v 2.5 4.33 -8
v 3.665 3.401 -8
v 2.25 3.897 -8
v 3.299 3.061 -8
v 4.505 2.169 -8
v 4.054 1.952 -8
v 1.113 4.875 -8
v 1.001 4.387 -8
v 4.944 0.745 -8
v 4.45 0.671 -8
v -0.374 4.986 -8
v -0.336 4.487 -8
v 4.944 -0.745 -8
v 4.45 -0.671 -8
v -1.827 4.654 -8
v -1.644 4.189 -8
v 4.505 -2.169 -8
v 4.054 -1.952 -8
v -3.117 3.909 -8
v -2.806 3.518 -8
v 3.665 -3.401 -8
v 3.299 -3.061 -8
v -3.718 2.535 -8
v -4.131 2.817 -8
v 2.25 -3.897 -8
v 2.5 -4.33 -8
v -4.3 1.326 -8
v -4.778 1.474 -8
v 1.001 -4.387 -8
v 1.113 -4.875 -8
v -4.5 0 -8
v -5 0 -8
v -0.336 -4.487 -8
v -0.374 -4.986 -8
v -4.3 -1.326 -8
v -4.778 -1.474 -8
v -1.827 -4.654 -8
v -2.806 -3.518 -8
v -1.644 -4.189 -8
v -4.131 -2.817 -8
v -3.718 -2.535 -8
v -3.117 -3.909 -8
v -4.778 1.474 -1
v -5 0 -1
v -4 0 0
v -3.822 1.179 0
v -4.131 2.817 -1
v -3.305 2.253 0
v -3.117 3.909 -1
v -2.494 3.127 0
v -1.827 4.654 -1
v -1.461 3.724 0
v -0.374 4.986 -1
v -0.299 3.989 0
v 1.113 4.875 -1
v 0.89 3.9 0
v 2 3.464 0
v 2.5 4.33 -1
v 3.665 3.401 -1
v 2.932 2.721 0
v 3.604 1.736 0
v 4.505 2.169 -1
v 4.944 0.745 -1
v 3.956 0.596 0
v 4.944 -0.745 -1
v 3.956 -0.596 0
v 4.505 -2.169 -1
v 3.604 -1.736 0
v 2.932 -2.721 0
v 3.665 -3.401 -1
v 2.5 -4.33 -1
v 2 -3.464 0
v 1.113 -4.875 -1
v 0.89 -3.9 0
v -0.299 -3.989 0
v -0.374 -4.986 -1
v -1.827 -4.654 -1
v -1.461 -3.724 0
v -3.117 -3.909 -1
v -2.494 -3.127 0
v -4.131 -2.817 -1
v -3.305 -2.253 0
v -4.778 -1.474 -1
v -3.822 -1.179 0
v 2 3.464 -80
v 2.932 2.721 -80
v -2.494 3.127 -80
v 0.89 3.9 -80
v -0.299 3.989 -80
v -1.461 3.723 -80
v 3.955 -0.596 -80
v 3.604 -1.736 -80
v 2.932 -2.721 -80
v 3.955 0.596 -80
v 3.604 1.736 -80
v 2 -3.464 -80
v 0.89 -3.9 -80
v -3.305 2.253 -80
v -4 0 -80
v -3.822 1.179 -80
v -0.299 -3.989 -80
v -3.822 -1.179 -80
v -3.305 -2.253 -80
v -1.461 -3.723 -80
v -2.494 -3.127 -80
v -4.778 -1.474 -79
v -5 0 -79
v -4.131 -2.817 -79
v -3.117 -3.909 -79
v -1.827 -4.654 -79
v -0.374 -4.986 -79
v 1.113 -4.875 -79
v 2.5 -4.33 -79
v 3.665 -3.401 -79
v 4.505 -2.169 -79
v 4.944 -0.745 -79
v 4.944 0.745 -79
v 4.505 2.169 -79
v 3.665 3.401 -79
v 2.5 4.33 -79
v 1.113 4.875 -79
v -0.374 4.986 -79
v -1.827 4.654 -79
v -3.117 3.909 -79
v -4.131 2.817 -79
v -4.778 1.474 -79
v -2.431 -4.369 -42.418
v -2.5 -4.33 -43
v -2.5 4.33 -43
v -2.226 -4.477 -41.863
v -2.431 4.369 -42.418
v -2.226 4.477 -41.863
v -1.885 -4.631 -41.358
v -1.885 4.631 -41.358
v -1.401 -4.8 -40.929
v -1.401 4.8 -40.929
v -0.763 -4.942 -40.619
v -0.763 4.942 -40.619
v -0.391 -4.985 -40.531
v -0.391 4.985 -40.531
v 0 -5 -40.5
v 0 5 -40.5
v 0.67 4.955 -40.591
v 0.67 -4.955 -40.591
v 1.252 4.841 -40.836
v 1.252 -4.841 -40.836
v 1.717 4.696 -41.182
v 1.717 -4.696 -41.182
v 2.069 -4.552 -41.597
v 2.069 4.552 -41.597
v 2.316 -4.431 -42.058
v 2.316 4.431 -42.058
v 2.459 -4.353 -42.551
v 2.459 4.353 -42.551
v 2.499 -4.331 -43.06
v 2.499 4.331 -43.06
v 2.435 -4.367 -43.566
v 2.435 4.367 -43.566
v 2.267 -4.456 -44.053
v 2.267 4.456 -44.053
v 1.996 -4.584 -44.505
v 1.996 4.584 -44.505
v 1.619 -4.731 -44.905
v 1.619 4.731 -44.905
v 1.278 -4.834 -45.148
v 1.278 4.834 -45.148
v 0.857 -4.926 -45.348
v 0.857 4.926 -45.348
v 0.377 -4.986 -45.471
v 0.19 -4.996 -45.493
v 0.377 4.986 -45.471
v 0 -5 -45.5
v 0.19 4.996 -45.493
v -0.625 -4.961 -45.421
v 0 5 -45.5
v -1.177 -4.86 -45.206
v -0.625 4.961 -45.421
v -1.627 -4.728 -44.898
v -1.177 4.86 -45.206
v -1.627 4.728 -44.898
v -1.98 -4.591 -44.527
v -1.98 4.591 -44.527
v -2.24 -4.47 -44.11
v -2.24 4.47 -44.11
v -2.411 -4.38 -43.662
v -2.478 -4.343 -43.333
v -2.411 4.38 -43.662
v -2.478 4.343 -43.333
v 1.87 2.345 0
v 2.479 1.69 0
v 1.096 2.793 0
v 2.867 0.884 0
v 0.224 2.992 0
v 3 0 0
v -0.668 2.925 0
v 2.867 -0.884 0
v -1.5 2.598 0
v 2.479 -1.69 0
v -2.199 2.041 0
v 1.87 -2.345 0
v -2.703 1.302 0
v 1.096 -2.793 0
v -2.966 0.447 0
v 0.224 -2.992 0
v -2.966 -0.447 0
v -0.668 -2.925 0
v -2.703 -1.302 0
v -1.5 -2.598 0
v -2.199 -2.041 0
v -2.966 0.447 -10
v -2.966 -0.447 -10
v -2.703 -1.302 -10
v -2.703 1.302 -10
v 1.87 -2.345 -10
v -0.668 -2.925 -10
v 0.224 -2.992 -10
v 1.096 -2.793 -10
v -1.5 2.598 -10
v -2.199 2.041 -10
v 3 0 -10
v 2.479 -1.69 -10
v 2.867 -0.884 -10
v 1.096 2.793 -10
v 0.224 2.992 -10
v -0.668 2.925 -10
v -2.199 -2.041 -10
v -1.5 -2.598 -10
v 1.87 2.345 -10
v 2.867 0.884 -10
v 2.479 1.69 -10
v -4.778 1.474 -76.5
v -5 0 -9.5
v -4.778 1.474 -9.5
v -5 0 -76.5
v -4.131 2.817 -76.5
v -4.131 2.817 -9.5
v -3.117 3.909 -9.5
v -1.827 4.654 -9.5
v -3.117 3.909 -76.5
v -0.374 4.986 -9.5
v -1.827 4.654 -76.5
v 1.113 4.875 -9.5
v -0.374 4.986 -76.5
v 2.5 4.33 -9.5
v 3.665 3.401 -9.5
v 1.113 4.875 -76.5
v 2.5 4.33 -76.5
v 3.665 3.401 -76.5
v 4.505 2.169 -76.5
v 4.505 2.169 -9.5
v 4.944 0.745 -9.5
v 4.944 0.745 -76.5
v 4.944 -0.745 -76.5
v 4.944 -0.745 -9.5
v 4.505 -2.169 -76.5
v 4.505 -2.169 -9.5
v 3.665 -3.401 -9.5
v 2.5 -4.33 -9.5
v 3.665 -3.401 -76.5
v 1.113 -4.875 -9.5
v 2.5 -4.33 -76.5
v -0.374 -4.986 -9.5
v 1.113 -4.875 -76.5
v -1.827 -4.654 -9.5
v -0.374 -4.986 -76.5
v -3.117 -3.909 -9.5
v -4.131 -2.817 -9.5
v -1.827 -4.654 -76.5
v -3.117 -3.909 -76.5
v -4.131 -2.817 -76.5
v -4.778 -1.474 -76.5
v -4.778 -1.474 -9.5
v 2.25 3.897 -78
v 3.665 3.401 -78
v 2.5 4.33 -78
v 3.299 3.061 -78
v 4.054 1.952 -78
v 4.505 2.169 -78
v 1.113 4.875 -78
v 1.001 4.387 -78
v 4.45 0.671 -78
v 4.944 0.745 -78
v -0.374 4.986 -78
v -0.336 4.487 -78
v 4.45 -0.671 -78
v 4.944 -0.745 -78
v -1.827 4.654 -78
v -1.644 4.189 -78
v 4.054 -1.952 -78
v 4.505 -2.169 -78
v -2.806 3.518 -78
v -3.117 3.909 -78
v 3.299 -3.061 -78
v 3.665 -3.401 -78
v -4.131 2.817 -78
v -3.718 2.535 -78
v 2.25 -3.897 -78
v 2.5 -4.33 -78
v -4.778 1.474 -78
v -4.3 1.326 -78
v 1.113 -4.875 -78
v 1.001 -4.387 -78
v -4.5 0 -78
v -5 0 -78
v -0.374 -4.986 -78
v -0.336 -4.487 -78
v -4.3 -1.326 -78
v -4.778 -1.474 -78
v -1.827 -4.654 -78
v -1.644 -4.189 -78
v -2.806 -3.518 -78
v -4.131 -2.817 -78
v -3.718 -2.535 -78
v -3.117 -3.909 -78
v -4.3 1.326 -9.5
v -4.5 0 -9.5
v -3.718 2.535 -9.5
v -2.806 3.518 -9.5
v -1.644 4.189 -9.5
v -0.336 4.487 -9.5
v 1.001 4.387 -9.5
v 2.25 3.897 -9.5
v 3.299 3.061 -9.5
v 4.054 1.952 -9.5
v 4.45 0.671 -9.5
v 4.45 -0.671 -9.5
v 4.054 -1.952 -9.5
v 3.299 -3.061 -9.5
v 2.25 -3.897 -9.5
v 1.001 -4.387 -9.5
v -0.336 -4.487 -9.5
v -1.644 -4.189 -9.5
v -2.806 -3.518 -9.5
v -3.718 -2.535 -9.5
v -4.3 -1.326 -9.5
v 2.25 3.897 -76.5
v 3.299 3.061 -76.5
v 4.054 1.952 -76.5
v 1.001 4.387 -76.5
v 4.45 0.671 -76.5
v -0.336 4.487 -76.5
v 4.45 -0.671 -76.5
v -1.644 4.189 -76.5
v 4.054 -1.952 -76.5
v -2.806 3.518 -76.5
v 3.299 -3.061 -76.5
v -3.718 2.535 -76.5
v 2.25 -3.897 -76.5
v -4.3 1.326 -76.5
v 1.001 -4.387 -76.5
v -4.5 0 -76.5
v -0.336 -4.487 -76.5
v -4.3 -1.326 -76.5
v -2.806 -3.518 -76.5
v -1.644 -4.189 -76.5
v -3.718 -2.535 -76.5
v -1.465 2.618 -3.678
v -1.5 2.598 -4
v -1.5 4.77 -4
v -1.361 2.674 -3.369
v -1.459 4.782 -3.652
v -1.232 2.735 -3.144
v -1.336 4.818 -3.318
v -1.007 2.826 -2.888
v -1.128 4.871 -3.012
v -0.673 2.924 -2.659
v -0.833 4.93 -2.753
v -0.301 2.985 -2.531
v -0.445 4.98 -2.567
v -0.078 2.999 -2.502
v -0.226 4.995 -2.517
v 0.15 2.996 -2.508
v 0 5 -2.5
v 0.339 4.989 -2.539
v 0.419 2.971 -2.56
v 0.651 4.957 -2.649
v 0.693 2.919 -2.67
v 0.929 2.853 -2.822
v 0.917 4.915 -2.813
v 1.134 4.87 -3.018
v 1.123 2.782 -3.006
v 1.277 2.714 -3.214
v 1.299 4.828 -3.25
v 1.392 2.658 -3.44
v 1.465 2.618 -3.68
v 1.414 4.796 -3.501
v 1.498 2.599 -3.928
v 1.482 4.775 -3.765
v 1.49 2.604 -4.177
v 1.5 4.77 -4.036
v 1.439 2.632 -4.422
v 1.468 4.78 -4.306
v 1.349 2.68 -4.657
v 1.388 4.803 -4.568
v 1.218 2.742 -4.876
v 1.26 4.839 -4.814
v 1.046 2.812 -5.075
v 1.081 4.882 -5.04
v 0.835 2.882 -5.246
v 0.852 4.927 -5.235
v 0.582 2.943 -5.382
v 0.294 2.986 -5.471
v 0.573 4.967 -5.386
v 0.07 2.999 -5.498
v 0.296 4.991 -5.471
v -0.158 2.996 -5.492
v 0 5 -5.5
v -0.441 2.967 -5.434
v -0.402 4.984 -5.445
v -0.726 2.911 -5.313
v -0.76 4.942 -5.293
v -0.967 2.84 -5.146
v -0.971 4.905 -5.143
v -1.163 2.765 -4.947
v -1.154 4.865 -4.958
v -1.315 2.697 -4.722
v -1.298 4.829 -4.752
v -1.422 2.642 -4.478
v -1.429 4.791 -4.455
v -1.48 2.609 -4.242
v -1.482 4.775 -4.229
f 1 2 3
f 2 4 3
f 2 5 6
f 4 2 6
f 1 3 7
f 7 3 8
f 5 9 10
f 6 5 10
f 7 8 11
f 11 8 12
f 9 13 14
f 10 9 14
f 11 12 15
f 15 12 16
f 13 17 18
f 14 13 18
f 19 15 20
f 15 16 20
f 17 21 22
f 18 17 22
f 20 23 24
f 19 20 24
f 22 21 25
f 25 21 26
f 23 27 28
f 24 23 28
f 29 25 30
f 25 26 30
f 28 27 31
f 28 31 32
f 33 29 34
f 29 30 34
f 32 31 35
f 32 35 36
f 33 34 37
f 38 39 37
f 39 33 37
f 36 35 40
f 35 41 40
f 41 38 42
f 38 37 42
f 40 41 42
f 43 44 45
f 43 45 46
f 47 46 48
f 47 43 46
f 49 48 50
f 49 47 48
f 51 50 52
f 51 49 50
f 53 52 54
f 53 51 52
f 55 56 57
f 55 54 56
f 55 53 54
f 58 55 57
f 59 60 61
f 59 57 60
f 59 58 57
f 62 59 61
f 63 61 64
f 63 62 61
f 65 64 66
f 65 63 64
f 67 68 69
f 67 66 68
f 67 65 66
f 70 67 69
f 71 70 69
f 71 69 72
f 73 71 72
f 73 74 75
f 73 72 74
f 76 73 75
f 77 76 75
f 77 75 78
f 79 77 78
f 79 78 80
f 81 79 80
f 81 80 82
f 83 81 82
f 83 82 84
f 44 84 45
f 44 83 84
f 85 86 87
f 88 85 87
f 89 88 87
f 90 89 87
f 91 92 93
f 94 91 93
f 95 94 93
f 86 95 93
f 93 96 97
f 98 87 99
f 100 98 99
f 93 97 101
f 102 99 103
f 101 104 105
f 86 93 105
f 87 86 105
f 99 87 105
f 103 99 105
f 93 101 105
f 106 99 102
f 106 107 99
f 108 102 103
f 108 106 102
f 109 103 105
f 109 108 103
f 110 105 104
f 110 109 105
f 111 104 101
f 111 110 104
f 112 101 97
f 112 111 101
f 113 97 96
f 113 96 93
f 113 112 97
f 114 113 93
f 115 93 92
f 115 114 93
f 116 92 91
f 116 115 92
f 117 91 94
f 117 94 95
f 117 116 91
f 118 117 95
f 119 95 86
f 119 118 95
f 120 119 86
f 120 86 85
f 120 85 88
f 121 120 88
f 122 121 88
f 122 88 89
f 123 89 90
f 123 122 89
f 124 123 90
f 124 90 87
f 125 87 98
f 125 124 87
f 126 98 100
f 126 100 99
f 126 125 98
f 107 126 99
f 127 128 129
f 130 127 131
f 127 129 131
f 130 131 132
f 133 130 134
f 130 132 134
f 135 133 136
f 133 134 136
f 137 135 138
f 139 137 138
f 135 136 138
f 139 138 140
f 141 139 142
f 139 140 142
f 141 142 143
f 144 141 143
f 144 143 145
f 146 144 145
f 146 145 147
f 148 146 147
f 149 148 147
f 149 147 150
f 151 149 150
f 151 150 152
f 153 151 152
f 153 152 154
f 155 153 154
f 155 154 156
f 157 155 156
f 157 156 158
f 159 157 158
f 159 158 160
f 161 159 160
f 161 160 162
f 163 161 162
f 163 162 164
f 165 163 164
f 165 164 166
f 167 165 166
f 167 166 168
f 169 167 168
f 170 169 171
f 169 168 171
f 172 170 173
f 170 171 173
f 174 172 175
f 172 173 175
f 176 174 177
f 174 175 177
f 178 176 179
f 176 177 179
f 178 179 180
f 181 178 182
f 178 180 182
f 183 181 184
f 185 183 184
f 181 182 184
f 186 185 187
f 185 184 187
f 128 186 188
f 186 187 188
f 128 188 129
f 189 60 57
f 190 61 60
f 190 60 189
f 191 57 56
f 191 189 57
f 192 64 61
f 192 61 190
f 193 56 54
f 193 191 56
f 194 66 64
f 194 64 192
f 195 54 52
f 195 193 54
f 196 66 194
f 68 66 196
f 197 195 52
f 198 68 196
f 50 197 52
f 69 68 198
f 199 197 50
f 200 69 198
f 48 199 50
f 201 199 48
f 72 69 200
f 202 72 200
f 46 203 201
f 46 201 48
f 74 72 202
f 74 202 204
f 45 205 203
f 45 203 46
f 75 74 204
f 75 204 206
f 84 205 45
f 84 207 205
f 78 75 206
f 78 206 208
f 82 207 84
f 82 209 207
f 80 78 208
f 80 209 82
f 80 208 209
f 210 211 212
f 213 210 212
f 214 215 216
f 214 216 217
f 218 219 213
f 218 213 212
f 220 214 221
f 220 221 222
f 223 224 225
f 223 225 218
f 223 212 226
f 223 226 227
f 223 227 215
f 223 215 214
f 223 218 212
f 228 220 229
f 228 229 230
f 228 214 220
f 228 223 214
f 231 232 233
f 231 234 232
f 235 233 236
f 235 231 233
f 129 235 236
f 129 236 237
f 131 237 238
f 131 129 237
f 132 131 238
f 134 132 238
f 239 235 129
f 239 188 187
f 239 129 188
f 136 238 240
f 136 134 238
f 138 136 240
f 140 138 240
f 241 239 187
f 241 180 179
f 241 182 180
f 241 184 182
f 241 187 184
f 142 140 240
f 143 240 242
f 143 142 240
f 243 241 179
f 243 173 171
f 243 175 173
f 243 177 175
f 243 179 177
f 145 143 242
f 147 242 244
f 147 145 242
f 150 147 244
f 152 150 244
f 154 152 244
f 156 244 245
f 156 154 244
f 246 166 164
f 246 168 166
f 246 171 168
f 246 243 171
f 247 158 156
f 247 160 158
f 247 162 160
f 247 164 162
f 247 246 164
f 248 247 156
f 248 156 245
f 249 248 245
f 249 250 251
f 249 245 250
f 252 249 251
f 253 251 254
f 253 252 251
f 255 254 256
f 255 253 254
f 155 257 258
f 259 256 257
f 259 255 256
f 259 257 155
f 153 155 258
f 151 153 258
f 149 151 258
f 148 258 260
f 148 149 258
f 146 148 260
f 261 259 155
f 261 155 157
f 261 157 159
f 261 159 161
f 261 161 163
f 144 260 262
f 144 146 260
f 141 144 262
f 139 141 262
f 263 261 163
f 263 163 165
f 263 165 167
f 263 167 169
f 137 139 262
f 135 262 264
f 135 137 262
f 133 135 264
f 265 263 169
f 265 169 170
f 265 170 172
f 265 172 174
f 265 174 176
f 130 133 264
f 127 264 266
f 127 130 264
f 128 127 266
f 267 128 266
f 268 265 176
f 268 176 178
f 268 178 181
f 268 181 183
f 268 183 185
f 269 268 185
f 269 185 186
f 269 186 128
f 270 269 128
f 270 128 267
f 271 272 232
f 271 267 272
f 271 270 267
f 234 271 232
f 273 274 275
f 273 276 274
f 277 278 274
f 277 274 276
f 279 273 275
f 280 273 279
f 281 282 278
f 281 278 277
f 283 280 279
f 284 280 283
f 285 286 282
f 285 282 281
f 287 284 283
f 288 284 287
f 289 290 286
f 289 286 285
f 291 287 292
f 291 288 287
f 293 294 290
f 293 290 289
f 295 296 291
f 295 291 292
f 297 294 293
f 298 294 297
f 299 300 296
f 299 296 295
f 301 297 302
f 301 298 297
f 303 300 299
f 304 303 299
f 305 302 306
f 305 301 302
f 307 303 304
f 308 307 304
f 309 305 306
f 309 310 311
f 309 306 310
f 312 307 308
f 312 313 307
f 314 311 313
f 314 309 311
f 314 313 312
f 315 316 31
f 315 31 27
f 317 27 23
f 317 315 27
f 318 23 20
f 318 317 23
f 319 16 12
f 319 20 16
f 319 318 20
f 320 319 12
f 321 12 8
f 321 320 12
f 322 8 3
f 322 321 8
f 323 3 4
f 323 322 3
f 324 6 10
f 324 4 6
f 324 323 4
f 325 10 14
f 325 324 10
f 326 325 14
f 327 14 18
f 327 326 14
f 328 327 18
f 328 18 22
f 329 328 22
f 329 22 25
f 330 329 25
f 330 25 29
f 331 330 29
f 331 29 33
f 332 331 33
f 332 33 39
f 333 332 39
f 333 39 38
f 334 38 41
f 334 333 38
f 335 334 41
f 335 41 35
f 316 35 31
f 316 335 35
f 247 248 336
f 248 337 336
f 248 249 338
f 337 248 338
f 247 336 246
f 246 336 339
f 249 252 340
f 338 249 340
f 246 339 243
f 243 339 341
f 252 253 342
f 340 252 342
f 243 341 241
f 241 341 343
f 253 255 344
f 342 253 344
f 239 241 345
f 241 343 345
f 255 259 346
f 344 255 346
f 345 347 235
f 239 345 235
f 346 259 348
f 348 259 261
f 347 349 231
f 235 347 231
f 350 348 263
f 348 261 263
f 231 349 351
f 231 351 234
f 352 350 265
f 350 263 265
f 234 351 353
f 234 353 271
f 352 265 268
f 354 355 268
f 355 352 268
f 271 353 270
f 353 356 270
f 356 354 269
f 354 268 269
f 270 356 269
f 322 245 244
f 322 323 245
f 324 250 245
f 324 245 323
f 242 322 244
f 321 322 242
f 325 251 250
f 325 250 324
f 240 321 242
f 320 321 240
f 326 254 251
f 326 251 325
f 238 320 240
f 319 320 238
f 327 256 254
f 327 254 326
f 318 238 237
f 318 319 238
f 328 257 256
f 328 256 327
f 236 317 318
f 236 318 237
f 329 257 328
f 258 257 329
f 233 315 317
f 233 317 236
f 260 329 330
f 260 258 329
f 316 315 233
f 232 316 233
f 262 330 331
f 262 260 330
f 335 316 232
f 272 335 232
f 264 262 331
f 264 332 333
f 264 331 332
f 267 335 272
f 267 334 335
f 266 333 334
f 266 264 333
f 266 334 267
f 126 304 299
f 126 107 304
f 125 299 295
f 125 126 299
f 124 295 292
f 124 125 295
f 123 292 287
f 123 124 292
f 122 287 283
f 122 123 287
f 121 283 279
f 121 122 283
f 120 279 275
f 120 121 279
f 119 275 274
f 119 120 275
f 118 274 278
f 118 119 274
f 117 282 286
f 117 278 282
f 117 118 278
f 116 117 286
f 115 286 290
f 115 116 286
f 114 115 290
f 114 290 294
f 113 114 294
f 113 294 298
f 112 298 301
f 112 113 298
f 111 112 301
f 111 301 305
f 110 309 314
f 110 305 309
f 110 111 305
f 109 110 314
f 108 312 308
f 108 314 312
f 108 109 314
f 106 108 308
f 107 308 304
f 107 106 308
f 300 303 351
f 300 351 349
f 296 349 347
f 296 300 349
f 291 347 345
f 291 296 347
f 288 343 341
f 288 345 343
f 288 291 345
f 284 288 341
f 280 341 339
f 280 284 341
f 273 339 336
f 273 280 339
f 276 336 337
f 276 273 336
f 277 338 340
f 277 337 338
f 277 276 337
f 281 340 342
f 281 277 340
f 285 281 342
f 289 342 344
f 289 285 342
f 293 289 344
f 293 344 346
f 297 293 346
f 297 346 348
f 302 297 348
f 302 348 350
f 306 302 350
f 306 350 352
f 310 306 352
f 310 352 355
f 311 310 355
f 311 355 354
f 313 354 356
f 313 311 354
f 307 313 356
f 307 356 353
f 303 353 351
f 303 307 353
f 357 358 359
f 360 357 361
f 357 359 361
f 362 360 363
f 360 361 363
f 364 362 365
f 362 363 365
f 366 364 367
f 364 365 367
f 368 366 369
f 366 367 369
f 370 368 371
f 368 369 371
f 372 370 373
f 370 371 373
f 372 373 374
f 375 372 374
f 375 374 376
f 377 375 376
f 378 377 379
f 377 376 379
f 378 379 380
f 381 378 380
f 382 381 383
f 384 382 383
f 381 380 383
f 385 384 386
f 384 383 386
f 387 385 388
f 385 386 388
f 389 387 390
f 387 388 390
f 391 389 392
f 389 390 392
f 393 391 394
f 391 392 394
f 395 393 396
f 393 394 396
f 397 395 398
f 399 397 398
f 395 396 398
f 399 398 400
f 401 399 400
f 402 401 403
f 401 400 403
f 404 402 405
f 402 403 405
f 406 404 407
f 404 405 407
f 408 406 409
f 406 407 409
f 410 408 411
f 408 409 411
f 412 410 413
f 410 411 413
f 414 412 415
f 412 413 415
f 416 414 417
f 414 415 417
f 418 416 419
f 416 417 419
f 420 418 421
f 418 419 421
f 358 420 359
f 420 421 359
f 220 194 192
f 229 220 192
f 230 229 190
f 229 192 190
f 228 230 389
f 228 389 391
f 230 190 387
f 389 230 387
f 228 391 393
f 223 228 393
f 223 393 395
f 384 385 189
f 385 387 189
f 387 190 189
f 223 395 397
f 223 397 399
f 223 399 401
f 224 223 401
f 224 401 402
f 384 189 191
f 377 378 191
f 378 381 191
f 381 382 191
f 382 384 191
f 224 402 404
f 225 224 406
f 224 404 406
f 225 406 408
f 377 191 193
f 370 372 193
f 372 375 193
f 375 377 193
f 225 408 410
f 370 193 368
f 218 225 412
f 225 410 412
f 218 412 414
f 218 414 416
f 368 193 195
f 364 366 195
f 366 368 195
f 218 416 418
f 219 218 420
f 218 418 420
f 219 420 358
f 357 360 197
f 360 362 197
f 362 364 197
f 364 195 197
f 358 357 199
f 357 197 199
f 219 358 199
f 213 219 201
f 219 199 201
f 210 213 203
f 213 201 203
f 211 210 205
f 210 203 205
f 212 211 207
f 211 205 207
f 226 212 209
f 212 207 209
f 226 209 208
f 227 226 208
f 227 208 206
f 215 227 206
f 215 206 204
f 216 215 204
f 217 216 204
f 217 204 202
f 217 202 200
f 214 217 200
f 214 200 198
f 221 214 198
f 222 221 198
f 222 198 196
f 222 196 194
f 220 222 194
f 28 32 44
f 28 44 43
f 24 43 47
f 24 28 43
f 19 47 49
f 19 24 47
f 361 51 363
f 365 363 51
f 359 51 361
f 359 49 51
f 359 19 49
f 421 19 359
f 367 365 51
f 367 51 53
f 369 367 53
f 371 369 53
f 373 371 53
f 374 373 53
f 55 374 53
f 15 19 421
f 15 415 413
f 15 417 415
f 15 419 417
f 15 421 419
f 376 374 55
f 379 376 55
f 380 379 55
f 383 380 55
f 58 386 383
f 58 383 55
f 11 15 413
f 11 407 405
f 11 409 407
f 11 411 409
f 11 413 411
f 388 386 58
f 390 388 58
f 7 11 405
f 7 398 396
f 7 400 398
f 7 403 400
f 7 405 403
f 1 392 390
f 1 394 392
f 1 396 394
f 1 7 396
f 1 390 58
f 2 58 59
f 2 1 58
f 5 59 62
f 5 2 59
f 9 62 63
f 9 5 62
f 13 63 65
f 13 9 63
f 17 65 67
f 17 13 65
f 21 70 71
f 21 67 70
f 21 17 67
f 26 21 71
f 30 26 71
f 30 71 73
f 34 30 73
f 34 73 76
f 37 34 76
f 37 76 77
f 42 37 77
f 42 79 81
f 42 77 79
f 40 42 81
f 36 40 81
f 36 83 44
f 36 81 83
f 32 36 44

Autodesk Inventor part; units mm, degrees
ref_plane "YZ Plane" through (0, 0, 0) normal (1, 0, 0) x (0, 1, 0)
ref_plane "XZ Plane" through (0, 0, 0) normal (0, 1, 0) x (-1, 0, 0)
sketch "Sketch1" plane through (0, 0, 0) normal (0, 1, 0) x (-1, 0, 0)
  line L0 (0, 0) -> (4.0002, 0)
  line L1 (4.0002, 0) -> (5, -0.9998)
  line L2 (5, -0.9998) -> (5, -8)
  line L3 (5, -8) -> (4.5, -8)
  line L4 (4.5, -8) -> (4.5, -9.5)
  line L5 (4.5, -9.5) -> (5, -9.5)
  line L6 (5, -9.5) -> (5, -76.5)
  line L7 (5, -76.5) -> (4.5, -76.5)
  line L8 (4.5, -76.5) -> (4.5, -78)
  line L9 (4.5, -78) -> (5, -78)
  line L10 (5, -78) -> (5, -79)
  line L11 (5, -79) -> (4, -80)
  line L12 (4, -80) -> (0, -80)
  line L13 (0, -80) -> (0, 0)
  dimension "d9" = 80
  dimension "d10" = 5
  dimension "d11" = 0.5
  dimension "d12" = 1.5
  dimension "d13" = 1.5
  dimension "d14" = 2
  dimension "d15" = 1
  dimension "d16" = 135
  dimension "d17" = 67
  dimension "d18" = 135
  dimension "d19" = 1.414
revolve "Revolution1" add sketch "Sketch1" angle 360 about axis through (0, 0, -80) along (0, 0, 1)
sketch "Sketch2" plane through (0, 0, 0) normal (0, 0, 1) x (1, 0, 0)
  circle A0 centre (0, 0) radius 3
  dimension "d21" = 6
extrude "Extrusion1" cut sketch "Sketch2" against normal blind 10
ref_plane "Work Plane1" through (0, 5, 0) normal (0, 1, 0) x (-1, 0, 0)
sketch "Sketch3" plane through (0, 5, 0) normal (0, 1, 0) x (-1, 0, 0)
  line L0 (-5, -9.5) -> (5, -9.5) projected
  line L1 (-5, -76.5) -> (5, -76.5) projected
  line L2 (-5, -9.5) -> (-5, -76.5) projected
  line L3 (5, -9.5) -> (5, -76.5) projected
  circle A0 centre (0, -43) radius 2.5
  point P0 (0, 0)
  dimension "d25" = 5
  dimension "d26" = 67
  dimension "d27" = 33.5
extrude "Extrusion2" cut sketch "Sketch3" against normal blind 10 contours A0
sketch "Sketch4" plane through (0, 5, 0) normal (0, 1, 0) x (-1, 0, 0)
  line L0 (-5, -0.9998) -> (5, -0.9998) projected
  line L1 (-5, -8) -> (5, -8) projected
  line L2 (-5, -0.9998) -> (-5, -8) projected
  line L3 (5, -0.9998) -> (5, -8) projected
  circle A0 centre (0, -4) radius 1.5
  line L4 (-4.0002, 0) -> (4.0002, 0) projected
  point P0 (0, 0)
  dimension "d30" = 3
  dimension "d31" = 4
extrude "Extrusion3" cut sketch "Sketch4" against normal up to surface contours A0
thread "Thread1" size "M3x0.5" class "6H" standard "ANSI Metric M Profile" length 10
thread "Thread2" size "M5x0.8" class "6H" standard "ANSI Metric M Profile" length 10
equation "\"d27\" = 0.5 * d26"
properties part number "potentiometer_aksel"
